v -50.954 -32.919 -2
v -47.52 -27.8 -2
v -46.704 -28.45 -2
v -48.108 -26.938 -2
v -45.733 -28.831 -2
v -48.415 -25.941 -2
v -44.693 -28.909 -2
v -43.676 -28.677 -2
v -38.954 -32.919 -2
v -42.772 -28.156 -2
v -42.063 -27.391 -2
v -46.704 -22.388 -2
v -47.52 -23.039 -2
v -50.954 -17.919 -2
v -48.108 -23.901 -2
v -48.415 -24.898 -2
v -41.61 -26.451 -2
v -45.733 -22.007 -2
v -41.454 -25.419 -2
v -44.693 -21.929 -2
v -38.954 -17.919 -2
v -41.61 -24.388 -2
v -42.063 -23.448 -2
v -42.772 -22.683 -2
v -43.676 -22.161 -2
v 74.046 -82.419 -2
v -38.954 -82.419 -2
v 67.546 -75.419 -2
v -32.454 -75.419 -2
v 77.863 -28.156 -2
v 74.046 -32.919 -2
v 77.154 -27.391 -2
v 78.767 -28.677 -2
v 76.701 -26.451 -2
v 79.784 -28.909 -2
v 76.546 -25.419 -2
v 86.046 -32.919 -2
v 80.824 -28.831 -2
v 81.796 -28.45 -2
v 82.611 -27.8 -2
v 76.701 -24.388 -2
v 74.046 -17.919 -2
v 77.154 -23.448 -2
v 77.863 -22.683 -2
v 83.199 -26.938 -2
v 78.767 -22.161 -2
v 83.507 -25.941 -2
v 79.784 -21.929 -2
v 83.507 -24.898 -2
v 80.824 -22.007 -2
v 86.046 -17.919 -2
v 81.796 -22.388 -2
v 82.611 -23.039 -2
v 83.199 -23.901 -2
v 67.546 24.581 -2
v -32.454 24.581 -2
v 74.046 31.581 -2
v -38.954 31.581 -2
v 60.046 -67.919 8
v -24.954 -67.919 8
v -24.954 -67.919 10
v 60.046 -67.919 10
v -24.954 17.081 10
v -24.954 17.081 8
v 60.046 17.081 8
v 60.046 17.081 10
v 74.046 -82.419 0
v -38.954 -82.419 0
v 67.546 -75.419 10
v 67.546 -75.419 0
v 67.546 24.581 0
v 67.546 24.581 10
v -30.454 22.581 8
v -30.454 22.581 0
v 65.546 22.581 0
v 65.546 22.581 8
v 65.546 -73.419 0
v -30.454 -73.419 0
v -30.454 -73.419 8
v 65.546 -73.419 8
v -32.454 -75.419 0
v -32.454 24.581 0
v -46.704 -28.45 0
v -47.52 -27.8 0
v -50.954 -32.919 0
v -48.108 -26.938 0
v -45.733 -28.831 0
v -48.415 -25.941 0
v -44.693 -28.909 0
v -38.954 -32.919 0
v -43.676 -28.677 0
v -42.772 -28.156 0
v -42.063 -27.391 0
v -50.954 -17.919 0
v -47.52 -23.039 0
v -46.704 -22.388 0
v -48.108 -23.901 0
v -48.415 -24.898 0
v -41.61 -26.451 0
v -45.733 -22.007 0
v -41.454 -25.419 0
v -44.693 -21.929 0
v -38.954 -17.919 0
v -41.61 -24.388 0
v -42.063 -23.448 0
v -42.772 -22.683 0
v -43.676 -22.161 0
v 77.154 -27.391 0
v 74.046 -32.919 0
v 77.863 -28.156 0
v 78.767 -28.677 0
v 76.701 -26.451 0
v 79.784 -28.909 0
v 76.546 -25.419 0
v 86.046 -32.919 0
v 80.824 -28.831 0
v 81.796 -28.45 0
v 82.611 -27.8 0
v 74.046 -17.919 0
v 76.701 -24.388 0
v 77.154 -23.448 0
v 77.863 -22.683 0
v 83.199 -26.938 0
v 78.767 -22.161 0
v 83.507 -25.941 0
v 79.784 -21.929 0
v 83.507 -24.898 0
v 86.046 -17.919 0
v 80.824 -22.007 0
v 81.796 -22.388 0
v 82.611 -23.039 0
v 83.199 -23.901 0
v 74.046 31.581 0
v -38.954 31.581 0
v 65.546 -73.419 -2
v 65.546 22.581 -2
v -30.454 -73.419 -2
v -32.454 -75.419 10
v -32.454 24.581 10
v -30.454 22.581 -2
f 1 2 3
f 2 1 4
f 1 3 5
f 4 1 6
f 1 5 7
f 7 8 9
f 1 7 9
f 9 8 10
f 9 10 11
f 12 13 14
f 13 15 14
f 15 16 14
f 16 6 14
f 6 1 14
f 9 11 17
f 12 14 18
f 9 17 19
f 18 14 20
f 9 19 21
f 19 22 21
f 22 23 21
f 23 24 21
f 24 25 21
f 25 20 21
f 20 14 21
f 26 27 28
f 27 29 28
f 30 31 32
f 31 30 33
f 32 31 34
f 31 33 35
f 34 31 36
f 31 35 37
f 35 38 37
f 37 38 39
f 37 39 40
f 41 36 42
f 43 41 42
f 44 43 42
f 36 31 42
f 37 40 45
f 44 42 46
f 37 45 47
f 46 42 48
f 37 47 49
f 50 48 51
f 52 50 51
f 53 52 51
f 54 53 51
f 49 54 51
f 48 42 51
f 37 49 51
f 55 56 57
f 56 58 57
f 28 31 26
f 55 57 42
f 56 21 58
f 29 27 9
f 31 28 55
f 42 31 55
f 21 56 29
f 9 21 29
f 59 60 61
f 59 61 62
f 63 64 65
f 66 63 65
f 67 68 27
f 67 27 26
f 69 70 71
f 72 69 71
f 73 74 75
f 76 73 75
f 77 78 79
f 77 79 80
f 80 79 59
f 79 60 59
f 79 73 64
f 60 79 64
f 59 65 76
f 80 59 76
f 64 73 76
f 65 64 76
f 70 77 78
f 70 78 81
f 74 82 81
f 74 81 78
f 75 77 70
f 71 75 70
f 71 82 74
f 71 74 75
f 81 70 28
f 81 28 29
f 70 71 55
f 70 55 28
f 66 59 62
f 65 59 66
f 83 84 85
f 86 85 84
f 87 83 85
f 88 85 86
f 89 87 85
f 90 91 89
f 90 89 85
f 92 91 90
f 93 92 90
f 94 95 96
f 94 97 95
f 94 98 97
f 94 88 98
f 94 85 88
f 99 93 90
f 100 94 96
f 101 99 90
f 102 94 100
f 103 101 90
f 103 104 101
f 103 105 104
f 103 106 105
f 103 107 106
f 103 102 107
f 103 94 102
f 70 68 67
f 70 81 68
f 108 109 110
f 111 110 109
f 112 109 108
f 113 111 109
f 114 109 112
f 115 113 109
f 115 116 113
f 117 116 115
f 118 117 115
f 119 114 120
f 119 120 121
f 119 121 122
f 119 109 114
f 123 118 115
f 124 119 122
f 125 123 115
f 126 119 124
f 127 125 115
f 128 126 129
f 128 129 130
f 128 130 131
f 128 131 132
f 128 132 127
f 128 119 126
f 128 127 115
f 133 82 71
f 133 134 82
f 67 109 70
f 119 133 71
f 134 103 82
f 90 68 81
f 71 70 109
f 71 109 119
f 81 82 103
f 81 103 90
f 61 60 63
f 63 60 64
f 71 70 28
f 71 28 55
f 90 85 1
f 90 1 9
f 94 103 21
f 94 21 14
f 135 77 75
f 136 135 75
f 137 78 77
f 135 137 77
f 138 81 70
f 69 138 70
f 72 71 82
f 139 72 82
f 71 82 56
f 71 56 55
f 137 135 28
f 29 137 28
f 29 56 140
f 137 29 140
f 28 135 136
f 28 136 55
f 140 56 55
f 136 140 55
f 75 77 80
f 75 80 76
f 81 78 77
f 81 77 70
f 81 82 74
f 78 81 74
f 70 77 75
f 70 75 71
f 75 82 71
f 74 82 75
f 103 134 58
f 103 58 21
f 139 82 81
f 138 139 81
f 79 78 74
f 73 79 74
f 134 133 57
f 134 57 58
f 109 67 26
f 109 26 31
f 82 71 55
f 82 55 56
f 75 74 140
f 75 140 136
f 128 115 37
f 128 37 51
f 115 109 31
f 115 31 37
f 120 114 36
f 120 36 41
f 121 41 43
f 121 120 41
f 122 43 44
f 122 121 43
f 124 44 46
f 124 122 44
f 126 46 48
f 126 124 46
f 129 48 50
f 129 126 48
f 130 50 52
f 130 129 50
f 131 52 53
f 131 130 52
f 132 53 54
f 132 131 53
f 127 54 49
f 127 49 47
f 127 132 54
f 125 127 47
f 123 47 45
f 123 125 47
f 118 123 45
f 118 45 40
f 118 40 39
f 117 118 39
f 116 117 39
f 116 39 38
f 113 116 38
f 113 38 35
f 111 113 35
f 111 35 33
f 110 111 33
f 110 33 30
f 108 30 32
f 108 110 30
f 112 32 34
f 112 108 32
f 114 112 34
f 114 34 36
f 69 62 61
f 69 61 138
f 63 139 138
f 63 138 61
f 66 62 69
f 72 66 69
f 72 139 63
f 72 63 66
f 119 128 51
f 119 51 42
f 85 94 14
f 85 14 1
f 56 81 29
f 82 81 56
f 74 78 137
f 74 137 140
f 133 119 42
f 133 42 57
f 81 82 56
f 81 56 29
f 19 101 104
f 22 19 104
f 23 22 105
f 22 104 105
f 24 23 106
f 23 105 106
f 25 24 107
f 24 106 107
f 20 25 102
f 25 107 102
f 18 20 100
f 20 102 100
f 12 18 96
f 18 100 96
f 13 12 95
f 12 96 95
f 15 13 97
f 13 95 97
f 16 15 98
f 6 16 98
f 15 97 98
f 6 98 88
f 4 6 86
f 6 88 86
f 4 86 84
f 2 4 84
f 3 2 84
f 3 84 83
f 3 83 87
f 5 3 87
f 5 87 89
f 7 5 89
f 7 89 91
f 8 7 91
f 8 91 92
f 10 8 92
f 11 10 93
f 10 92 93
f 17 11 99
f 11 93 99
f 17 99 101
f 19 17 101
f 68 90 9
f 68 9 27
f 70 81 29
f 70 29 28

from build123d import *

# Parameters (mm, degrees)
F0_R     = 3.5
F1_DEPTH = 2
F0_W     = 96
F0_H     = 96
F0_W_2   = 85
F0_H_2   = 85
F2_DEPTH = 10
F3_DEPTH = 8
F4_DEPTH = 2


with BuildPart() as f1:
    # F0 (on Top) → F1 (new body)
    with BuildSketch(Plane.XY):
        Polygon((67.5456341952, -75.4192389548), (74.0456341952, -82.4192389548), (74.0456341952, -32.9192389548), (74.0456341952, -25.4192389548), (67.5456341952, -25.4192389548), align=None)
        Polygon((17.5456341952, -82.4192389548), (74.0456341952, -82.4192389548), (67.5456341952, -75.4192389548), (17.5456341952, -75.4192389548), align=None)
        Polygon((-38.9543658048, -82.4192389548), (17.5456341952, -82.4192389548), (17.5456341952, -75.4192389548), (-32.4543658048, -75.4192389548), align=None)
        Polygon((74.0456341952, -25.4192389548), (74.0456341952, -32.9192389548), (86.0456341952, -32.9192389548), (86.0456341952, -17.9192389548), (74.0456341952, -17.9192389548), align=None)
        with BuildLine():
            ThreePointArc((83.5456341952, -25.4192389548), (80.0456341952, -28.9192389548), (76.5456341952, -25.4192389548))
            ThreePointArc((76.5456341952, -25.4192389548), (80.0456341952, -21.9192389548), (83.5456341952, -25.4192389548))
        make_face(mode=Mode.SUBTRACT)
        Polygon((-38.9543658048, -32.9192389548), (-38.9543658048, -82.4192389548), (-32.4543658048, -75.4192389548), (-32.4543658048, -25.4192389548), (-38.9543658048, -25.4192389548), align=None)
        Polygon((67.5456341952, -25.4192389548), (74.0456341952, -25.4192389548), (74.0456341952, -17.9192389548), (74.0456341952, 31.5807610452), (67.5456341952, 24.5807610452), align=None)
        Polygon((-50.9543658048, -32.9192389548), (-38.9543658048, -32.9192389548), (-38.9543658048, -25.4192389548), (-38.9543658048, -17.9192389548), (-50.9543658048, -17.9192389548), align=None)
        with Locations((-44.9543658048, -25.4192389548)):
            Circle(F0_R, mode=Mode.SUBTRACT)
        Polygon((17.5456341952, 24.5807610452), (67.5456341952, 24.5807610452), (74.0456341952, 31.5807610452), (17.5456341952, 31.5807610452), align=None)
        Polygon((-38.9543658048, -17.9192389548), (-38.9543658048, -25.4192389548), (-32.4543658048, -25.4192389548), (-32.4543658048, 24.5807610452), (-38.9543658048, 31.5807610452), align=None)
        Polygon((-32.4543658048, 24.5807610452), (17.5456341952, 24.5807610452), (17.5456341952, 31.5807610452), (-38.9543658048, 31.5807610452), align=None)
    extrude(amount=-F1_DEPTH)

    # F0 (on Top) → F2 (join)
    with BuildSketch(Plane.XY):
        Polygon((17.5456341952, -75.4192389548), (67.5456341952, -75.4192389548), (67.5456341952, -25.4192389548), (67.5456341952, 24.5807610452), (17.5456341952, 24.5807610452), (-32.4543658048, 24.5807610452), (-32.4543658048, -25.4192389548), (-32.4543658048, -75.4192389548), align=None)
        with Locations((17.5456341952, -25.4192389548)):
            Rectangle(F0_W, F0_H, mode=Mode.SUBTRACT)
        with Locations((17.5456341952, -25.4192389548)):
            Rectangle(F0_W, F0_H)
        with Locations((17.5456341952, -25.4192389548)):
            Rectangle(F0_W_2, F0_H_2, mode=Mode.SUBTRACT)
    extrude(amount=F2_DEPTH)

    # F0 (on Top) → F3 (cut)
    with BuildSketch(Plane.XY):
        with Locations((17.5456341952, -25.4192389548)):
            Rectangle(F0_W, F0_H)
        with Locations((17.5456341952, -25.4192389548)):
            Rectangle(F0_W_2, F0_H_2, mode=Mode.SUBTRACT)
    extrude(amount=F3_DEPTH, mode=Mode.SUBTRACT)


with BuildPart() as f4:
    # F0 (on Top) → F4 (new body)
    with BuildSketch(Plane.XY):
        Polygon((17.5456341952, -75.4192389548), (67.5456341952, -75.4192389548), (67.5456341952, -25.4192389548), (67.5456341952, 24.5807610452), (17.5456341952, 24.5807610452), (-32.4543658048, 24.5807610452), (-32.4543658048, -25.4192389548), (-32.4543658048, -75.4192389548), align=None)
        with Locations((17.5456341952, -25.4192389548)):
            Rectangle(F0_W, F0_H, mode=Mode.SUBTRACT)
    extrude(amount=-F4_DEPTH)


solid = Compound([f1.part, f4.part])
